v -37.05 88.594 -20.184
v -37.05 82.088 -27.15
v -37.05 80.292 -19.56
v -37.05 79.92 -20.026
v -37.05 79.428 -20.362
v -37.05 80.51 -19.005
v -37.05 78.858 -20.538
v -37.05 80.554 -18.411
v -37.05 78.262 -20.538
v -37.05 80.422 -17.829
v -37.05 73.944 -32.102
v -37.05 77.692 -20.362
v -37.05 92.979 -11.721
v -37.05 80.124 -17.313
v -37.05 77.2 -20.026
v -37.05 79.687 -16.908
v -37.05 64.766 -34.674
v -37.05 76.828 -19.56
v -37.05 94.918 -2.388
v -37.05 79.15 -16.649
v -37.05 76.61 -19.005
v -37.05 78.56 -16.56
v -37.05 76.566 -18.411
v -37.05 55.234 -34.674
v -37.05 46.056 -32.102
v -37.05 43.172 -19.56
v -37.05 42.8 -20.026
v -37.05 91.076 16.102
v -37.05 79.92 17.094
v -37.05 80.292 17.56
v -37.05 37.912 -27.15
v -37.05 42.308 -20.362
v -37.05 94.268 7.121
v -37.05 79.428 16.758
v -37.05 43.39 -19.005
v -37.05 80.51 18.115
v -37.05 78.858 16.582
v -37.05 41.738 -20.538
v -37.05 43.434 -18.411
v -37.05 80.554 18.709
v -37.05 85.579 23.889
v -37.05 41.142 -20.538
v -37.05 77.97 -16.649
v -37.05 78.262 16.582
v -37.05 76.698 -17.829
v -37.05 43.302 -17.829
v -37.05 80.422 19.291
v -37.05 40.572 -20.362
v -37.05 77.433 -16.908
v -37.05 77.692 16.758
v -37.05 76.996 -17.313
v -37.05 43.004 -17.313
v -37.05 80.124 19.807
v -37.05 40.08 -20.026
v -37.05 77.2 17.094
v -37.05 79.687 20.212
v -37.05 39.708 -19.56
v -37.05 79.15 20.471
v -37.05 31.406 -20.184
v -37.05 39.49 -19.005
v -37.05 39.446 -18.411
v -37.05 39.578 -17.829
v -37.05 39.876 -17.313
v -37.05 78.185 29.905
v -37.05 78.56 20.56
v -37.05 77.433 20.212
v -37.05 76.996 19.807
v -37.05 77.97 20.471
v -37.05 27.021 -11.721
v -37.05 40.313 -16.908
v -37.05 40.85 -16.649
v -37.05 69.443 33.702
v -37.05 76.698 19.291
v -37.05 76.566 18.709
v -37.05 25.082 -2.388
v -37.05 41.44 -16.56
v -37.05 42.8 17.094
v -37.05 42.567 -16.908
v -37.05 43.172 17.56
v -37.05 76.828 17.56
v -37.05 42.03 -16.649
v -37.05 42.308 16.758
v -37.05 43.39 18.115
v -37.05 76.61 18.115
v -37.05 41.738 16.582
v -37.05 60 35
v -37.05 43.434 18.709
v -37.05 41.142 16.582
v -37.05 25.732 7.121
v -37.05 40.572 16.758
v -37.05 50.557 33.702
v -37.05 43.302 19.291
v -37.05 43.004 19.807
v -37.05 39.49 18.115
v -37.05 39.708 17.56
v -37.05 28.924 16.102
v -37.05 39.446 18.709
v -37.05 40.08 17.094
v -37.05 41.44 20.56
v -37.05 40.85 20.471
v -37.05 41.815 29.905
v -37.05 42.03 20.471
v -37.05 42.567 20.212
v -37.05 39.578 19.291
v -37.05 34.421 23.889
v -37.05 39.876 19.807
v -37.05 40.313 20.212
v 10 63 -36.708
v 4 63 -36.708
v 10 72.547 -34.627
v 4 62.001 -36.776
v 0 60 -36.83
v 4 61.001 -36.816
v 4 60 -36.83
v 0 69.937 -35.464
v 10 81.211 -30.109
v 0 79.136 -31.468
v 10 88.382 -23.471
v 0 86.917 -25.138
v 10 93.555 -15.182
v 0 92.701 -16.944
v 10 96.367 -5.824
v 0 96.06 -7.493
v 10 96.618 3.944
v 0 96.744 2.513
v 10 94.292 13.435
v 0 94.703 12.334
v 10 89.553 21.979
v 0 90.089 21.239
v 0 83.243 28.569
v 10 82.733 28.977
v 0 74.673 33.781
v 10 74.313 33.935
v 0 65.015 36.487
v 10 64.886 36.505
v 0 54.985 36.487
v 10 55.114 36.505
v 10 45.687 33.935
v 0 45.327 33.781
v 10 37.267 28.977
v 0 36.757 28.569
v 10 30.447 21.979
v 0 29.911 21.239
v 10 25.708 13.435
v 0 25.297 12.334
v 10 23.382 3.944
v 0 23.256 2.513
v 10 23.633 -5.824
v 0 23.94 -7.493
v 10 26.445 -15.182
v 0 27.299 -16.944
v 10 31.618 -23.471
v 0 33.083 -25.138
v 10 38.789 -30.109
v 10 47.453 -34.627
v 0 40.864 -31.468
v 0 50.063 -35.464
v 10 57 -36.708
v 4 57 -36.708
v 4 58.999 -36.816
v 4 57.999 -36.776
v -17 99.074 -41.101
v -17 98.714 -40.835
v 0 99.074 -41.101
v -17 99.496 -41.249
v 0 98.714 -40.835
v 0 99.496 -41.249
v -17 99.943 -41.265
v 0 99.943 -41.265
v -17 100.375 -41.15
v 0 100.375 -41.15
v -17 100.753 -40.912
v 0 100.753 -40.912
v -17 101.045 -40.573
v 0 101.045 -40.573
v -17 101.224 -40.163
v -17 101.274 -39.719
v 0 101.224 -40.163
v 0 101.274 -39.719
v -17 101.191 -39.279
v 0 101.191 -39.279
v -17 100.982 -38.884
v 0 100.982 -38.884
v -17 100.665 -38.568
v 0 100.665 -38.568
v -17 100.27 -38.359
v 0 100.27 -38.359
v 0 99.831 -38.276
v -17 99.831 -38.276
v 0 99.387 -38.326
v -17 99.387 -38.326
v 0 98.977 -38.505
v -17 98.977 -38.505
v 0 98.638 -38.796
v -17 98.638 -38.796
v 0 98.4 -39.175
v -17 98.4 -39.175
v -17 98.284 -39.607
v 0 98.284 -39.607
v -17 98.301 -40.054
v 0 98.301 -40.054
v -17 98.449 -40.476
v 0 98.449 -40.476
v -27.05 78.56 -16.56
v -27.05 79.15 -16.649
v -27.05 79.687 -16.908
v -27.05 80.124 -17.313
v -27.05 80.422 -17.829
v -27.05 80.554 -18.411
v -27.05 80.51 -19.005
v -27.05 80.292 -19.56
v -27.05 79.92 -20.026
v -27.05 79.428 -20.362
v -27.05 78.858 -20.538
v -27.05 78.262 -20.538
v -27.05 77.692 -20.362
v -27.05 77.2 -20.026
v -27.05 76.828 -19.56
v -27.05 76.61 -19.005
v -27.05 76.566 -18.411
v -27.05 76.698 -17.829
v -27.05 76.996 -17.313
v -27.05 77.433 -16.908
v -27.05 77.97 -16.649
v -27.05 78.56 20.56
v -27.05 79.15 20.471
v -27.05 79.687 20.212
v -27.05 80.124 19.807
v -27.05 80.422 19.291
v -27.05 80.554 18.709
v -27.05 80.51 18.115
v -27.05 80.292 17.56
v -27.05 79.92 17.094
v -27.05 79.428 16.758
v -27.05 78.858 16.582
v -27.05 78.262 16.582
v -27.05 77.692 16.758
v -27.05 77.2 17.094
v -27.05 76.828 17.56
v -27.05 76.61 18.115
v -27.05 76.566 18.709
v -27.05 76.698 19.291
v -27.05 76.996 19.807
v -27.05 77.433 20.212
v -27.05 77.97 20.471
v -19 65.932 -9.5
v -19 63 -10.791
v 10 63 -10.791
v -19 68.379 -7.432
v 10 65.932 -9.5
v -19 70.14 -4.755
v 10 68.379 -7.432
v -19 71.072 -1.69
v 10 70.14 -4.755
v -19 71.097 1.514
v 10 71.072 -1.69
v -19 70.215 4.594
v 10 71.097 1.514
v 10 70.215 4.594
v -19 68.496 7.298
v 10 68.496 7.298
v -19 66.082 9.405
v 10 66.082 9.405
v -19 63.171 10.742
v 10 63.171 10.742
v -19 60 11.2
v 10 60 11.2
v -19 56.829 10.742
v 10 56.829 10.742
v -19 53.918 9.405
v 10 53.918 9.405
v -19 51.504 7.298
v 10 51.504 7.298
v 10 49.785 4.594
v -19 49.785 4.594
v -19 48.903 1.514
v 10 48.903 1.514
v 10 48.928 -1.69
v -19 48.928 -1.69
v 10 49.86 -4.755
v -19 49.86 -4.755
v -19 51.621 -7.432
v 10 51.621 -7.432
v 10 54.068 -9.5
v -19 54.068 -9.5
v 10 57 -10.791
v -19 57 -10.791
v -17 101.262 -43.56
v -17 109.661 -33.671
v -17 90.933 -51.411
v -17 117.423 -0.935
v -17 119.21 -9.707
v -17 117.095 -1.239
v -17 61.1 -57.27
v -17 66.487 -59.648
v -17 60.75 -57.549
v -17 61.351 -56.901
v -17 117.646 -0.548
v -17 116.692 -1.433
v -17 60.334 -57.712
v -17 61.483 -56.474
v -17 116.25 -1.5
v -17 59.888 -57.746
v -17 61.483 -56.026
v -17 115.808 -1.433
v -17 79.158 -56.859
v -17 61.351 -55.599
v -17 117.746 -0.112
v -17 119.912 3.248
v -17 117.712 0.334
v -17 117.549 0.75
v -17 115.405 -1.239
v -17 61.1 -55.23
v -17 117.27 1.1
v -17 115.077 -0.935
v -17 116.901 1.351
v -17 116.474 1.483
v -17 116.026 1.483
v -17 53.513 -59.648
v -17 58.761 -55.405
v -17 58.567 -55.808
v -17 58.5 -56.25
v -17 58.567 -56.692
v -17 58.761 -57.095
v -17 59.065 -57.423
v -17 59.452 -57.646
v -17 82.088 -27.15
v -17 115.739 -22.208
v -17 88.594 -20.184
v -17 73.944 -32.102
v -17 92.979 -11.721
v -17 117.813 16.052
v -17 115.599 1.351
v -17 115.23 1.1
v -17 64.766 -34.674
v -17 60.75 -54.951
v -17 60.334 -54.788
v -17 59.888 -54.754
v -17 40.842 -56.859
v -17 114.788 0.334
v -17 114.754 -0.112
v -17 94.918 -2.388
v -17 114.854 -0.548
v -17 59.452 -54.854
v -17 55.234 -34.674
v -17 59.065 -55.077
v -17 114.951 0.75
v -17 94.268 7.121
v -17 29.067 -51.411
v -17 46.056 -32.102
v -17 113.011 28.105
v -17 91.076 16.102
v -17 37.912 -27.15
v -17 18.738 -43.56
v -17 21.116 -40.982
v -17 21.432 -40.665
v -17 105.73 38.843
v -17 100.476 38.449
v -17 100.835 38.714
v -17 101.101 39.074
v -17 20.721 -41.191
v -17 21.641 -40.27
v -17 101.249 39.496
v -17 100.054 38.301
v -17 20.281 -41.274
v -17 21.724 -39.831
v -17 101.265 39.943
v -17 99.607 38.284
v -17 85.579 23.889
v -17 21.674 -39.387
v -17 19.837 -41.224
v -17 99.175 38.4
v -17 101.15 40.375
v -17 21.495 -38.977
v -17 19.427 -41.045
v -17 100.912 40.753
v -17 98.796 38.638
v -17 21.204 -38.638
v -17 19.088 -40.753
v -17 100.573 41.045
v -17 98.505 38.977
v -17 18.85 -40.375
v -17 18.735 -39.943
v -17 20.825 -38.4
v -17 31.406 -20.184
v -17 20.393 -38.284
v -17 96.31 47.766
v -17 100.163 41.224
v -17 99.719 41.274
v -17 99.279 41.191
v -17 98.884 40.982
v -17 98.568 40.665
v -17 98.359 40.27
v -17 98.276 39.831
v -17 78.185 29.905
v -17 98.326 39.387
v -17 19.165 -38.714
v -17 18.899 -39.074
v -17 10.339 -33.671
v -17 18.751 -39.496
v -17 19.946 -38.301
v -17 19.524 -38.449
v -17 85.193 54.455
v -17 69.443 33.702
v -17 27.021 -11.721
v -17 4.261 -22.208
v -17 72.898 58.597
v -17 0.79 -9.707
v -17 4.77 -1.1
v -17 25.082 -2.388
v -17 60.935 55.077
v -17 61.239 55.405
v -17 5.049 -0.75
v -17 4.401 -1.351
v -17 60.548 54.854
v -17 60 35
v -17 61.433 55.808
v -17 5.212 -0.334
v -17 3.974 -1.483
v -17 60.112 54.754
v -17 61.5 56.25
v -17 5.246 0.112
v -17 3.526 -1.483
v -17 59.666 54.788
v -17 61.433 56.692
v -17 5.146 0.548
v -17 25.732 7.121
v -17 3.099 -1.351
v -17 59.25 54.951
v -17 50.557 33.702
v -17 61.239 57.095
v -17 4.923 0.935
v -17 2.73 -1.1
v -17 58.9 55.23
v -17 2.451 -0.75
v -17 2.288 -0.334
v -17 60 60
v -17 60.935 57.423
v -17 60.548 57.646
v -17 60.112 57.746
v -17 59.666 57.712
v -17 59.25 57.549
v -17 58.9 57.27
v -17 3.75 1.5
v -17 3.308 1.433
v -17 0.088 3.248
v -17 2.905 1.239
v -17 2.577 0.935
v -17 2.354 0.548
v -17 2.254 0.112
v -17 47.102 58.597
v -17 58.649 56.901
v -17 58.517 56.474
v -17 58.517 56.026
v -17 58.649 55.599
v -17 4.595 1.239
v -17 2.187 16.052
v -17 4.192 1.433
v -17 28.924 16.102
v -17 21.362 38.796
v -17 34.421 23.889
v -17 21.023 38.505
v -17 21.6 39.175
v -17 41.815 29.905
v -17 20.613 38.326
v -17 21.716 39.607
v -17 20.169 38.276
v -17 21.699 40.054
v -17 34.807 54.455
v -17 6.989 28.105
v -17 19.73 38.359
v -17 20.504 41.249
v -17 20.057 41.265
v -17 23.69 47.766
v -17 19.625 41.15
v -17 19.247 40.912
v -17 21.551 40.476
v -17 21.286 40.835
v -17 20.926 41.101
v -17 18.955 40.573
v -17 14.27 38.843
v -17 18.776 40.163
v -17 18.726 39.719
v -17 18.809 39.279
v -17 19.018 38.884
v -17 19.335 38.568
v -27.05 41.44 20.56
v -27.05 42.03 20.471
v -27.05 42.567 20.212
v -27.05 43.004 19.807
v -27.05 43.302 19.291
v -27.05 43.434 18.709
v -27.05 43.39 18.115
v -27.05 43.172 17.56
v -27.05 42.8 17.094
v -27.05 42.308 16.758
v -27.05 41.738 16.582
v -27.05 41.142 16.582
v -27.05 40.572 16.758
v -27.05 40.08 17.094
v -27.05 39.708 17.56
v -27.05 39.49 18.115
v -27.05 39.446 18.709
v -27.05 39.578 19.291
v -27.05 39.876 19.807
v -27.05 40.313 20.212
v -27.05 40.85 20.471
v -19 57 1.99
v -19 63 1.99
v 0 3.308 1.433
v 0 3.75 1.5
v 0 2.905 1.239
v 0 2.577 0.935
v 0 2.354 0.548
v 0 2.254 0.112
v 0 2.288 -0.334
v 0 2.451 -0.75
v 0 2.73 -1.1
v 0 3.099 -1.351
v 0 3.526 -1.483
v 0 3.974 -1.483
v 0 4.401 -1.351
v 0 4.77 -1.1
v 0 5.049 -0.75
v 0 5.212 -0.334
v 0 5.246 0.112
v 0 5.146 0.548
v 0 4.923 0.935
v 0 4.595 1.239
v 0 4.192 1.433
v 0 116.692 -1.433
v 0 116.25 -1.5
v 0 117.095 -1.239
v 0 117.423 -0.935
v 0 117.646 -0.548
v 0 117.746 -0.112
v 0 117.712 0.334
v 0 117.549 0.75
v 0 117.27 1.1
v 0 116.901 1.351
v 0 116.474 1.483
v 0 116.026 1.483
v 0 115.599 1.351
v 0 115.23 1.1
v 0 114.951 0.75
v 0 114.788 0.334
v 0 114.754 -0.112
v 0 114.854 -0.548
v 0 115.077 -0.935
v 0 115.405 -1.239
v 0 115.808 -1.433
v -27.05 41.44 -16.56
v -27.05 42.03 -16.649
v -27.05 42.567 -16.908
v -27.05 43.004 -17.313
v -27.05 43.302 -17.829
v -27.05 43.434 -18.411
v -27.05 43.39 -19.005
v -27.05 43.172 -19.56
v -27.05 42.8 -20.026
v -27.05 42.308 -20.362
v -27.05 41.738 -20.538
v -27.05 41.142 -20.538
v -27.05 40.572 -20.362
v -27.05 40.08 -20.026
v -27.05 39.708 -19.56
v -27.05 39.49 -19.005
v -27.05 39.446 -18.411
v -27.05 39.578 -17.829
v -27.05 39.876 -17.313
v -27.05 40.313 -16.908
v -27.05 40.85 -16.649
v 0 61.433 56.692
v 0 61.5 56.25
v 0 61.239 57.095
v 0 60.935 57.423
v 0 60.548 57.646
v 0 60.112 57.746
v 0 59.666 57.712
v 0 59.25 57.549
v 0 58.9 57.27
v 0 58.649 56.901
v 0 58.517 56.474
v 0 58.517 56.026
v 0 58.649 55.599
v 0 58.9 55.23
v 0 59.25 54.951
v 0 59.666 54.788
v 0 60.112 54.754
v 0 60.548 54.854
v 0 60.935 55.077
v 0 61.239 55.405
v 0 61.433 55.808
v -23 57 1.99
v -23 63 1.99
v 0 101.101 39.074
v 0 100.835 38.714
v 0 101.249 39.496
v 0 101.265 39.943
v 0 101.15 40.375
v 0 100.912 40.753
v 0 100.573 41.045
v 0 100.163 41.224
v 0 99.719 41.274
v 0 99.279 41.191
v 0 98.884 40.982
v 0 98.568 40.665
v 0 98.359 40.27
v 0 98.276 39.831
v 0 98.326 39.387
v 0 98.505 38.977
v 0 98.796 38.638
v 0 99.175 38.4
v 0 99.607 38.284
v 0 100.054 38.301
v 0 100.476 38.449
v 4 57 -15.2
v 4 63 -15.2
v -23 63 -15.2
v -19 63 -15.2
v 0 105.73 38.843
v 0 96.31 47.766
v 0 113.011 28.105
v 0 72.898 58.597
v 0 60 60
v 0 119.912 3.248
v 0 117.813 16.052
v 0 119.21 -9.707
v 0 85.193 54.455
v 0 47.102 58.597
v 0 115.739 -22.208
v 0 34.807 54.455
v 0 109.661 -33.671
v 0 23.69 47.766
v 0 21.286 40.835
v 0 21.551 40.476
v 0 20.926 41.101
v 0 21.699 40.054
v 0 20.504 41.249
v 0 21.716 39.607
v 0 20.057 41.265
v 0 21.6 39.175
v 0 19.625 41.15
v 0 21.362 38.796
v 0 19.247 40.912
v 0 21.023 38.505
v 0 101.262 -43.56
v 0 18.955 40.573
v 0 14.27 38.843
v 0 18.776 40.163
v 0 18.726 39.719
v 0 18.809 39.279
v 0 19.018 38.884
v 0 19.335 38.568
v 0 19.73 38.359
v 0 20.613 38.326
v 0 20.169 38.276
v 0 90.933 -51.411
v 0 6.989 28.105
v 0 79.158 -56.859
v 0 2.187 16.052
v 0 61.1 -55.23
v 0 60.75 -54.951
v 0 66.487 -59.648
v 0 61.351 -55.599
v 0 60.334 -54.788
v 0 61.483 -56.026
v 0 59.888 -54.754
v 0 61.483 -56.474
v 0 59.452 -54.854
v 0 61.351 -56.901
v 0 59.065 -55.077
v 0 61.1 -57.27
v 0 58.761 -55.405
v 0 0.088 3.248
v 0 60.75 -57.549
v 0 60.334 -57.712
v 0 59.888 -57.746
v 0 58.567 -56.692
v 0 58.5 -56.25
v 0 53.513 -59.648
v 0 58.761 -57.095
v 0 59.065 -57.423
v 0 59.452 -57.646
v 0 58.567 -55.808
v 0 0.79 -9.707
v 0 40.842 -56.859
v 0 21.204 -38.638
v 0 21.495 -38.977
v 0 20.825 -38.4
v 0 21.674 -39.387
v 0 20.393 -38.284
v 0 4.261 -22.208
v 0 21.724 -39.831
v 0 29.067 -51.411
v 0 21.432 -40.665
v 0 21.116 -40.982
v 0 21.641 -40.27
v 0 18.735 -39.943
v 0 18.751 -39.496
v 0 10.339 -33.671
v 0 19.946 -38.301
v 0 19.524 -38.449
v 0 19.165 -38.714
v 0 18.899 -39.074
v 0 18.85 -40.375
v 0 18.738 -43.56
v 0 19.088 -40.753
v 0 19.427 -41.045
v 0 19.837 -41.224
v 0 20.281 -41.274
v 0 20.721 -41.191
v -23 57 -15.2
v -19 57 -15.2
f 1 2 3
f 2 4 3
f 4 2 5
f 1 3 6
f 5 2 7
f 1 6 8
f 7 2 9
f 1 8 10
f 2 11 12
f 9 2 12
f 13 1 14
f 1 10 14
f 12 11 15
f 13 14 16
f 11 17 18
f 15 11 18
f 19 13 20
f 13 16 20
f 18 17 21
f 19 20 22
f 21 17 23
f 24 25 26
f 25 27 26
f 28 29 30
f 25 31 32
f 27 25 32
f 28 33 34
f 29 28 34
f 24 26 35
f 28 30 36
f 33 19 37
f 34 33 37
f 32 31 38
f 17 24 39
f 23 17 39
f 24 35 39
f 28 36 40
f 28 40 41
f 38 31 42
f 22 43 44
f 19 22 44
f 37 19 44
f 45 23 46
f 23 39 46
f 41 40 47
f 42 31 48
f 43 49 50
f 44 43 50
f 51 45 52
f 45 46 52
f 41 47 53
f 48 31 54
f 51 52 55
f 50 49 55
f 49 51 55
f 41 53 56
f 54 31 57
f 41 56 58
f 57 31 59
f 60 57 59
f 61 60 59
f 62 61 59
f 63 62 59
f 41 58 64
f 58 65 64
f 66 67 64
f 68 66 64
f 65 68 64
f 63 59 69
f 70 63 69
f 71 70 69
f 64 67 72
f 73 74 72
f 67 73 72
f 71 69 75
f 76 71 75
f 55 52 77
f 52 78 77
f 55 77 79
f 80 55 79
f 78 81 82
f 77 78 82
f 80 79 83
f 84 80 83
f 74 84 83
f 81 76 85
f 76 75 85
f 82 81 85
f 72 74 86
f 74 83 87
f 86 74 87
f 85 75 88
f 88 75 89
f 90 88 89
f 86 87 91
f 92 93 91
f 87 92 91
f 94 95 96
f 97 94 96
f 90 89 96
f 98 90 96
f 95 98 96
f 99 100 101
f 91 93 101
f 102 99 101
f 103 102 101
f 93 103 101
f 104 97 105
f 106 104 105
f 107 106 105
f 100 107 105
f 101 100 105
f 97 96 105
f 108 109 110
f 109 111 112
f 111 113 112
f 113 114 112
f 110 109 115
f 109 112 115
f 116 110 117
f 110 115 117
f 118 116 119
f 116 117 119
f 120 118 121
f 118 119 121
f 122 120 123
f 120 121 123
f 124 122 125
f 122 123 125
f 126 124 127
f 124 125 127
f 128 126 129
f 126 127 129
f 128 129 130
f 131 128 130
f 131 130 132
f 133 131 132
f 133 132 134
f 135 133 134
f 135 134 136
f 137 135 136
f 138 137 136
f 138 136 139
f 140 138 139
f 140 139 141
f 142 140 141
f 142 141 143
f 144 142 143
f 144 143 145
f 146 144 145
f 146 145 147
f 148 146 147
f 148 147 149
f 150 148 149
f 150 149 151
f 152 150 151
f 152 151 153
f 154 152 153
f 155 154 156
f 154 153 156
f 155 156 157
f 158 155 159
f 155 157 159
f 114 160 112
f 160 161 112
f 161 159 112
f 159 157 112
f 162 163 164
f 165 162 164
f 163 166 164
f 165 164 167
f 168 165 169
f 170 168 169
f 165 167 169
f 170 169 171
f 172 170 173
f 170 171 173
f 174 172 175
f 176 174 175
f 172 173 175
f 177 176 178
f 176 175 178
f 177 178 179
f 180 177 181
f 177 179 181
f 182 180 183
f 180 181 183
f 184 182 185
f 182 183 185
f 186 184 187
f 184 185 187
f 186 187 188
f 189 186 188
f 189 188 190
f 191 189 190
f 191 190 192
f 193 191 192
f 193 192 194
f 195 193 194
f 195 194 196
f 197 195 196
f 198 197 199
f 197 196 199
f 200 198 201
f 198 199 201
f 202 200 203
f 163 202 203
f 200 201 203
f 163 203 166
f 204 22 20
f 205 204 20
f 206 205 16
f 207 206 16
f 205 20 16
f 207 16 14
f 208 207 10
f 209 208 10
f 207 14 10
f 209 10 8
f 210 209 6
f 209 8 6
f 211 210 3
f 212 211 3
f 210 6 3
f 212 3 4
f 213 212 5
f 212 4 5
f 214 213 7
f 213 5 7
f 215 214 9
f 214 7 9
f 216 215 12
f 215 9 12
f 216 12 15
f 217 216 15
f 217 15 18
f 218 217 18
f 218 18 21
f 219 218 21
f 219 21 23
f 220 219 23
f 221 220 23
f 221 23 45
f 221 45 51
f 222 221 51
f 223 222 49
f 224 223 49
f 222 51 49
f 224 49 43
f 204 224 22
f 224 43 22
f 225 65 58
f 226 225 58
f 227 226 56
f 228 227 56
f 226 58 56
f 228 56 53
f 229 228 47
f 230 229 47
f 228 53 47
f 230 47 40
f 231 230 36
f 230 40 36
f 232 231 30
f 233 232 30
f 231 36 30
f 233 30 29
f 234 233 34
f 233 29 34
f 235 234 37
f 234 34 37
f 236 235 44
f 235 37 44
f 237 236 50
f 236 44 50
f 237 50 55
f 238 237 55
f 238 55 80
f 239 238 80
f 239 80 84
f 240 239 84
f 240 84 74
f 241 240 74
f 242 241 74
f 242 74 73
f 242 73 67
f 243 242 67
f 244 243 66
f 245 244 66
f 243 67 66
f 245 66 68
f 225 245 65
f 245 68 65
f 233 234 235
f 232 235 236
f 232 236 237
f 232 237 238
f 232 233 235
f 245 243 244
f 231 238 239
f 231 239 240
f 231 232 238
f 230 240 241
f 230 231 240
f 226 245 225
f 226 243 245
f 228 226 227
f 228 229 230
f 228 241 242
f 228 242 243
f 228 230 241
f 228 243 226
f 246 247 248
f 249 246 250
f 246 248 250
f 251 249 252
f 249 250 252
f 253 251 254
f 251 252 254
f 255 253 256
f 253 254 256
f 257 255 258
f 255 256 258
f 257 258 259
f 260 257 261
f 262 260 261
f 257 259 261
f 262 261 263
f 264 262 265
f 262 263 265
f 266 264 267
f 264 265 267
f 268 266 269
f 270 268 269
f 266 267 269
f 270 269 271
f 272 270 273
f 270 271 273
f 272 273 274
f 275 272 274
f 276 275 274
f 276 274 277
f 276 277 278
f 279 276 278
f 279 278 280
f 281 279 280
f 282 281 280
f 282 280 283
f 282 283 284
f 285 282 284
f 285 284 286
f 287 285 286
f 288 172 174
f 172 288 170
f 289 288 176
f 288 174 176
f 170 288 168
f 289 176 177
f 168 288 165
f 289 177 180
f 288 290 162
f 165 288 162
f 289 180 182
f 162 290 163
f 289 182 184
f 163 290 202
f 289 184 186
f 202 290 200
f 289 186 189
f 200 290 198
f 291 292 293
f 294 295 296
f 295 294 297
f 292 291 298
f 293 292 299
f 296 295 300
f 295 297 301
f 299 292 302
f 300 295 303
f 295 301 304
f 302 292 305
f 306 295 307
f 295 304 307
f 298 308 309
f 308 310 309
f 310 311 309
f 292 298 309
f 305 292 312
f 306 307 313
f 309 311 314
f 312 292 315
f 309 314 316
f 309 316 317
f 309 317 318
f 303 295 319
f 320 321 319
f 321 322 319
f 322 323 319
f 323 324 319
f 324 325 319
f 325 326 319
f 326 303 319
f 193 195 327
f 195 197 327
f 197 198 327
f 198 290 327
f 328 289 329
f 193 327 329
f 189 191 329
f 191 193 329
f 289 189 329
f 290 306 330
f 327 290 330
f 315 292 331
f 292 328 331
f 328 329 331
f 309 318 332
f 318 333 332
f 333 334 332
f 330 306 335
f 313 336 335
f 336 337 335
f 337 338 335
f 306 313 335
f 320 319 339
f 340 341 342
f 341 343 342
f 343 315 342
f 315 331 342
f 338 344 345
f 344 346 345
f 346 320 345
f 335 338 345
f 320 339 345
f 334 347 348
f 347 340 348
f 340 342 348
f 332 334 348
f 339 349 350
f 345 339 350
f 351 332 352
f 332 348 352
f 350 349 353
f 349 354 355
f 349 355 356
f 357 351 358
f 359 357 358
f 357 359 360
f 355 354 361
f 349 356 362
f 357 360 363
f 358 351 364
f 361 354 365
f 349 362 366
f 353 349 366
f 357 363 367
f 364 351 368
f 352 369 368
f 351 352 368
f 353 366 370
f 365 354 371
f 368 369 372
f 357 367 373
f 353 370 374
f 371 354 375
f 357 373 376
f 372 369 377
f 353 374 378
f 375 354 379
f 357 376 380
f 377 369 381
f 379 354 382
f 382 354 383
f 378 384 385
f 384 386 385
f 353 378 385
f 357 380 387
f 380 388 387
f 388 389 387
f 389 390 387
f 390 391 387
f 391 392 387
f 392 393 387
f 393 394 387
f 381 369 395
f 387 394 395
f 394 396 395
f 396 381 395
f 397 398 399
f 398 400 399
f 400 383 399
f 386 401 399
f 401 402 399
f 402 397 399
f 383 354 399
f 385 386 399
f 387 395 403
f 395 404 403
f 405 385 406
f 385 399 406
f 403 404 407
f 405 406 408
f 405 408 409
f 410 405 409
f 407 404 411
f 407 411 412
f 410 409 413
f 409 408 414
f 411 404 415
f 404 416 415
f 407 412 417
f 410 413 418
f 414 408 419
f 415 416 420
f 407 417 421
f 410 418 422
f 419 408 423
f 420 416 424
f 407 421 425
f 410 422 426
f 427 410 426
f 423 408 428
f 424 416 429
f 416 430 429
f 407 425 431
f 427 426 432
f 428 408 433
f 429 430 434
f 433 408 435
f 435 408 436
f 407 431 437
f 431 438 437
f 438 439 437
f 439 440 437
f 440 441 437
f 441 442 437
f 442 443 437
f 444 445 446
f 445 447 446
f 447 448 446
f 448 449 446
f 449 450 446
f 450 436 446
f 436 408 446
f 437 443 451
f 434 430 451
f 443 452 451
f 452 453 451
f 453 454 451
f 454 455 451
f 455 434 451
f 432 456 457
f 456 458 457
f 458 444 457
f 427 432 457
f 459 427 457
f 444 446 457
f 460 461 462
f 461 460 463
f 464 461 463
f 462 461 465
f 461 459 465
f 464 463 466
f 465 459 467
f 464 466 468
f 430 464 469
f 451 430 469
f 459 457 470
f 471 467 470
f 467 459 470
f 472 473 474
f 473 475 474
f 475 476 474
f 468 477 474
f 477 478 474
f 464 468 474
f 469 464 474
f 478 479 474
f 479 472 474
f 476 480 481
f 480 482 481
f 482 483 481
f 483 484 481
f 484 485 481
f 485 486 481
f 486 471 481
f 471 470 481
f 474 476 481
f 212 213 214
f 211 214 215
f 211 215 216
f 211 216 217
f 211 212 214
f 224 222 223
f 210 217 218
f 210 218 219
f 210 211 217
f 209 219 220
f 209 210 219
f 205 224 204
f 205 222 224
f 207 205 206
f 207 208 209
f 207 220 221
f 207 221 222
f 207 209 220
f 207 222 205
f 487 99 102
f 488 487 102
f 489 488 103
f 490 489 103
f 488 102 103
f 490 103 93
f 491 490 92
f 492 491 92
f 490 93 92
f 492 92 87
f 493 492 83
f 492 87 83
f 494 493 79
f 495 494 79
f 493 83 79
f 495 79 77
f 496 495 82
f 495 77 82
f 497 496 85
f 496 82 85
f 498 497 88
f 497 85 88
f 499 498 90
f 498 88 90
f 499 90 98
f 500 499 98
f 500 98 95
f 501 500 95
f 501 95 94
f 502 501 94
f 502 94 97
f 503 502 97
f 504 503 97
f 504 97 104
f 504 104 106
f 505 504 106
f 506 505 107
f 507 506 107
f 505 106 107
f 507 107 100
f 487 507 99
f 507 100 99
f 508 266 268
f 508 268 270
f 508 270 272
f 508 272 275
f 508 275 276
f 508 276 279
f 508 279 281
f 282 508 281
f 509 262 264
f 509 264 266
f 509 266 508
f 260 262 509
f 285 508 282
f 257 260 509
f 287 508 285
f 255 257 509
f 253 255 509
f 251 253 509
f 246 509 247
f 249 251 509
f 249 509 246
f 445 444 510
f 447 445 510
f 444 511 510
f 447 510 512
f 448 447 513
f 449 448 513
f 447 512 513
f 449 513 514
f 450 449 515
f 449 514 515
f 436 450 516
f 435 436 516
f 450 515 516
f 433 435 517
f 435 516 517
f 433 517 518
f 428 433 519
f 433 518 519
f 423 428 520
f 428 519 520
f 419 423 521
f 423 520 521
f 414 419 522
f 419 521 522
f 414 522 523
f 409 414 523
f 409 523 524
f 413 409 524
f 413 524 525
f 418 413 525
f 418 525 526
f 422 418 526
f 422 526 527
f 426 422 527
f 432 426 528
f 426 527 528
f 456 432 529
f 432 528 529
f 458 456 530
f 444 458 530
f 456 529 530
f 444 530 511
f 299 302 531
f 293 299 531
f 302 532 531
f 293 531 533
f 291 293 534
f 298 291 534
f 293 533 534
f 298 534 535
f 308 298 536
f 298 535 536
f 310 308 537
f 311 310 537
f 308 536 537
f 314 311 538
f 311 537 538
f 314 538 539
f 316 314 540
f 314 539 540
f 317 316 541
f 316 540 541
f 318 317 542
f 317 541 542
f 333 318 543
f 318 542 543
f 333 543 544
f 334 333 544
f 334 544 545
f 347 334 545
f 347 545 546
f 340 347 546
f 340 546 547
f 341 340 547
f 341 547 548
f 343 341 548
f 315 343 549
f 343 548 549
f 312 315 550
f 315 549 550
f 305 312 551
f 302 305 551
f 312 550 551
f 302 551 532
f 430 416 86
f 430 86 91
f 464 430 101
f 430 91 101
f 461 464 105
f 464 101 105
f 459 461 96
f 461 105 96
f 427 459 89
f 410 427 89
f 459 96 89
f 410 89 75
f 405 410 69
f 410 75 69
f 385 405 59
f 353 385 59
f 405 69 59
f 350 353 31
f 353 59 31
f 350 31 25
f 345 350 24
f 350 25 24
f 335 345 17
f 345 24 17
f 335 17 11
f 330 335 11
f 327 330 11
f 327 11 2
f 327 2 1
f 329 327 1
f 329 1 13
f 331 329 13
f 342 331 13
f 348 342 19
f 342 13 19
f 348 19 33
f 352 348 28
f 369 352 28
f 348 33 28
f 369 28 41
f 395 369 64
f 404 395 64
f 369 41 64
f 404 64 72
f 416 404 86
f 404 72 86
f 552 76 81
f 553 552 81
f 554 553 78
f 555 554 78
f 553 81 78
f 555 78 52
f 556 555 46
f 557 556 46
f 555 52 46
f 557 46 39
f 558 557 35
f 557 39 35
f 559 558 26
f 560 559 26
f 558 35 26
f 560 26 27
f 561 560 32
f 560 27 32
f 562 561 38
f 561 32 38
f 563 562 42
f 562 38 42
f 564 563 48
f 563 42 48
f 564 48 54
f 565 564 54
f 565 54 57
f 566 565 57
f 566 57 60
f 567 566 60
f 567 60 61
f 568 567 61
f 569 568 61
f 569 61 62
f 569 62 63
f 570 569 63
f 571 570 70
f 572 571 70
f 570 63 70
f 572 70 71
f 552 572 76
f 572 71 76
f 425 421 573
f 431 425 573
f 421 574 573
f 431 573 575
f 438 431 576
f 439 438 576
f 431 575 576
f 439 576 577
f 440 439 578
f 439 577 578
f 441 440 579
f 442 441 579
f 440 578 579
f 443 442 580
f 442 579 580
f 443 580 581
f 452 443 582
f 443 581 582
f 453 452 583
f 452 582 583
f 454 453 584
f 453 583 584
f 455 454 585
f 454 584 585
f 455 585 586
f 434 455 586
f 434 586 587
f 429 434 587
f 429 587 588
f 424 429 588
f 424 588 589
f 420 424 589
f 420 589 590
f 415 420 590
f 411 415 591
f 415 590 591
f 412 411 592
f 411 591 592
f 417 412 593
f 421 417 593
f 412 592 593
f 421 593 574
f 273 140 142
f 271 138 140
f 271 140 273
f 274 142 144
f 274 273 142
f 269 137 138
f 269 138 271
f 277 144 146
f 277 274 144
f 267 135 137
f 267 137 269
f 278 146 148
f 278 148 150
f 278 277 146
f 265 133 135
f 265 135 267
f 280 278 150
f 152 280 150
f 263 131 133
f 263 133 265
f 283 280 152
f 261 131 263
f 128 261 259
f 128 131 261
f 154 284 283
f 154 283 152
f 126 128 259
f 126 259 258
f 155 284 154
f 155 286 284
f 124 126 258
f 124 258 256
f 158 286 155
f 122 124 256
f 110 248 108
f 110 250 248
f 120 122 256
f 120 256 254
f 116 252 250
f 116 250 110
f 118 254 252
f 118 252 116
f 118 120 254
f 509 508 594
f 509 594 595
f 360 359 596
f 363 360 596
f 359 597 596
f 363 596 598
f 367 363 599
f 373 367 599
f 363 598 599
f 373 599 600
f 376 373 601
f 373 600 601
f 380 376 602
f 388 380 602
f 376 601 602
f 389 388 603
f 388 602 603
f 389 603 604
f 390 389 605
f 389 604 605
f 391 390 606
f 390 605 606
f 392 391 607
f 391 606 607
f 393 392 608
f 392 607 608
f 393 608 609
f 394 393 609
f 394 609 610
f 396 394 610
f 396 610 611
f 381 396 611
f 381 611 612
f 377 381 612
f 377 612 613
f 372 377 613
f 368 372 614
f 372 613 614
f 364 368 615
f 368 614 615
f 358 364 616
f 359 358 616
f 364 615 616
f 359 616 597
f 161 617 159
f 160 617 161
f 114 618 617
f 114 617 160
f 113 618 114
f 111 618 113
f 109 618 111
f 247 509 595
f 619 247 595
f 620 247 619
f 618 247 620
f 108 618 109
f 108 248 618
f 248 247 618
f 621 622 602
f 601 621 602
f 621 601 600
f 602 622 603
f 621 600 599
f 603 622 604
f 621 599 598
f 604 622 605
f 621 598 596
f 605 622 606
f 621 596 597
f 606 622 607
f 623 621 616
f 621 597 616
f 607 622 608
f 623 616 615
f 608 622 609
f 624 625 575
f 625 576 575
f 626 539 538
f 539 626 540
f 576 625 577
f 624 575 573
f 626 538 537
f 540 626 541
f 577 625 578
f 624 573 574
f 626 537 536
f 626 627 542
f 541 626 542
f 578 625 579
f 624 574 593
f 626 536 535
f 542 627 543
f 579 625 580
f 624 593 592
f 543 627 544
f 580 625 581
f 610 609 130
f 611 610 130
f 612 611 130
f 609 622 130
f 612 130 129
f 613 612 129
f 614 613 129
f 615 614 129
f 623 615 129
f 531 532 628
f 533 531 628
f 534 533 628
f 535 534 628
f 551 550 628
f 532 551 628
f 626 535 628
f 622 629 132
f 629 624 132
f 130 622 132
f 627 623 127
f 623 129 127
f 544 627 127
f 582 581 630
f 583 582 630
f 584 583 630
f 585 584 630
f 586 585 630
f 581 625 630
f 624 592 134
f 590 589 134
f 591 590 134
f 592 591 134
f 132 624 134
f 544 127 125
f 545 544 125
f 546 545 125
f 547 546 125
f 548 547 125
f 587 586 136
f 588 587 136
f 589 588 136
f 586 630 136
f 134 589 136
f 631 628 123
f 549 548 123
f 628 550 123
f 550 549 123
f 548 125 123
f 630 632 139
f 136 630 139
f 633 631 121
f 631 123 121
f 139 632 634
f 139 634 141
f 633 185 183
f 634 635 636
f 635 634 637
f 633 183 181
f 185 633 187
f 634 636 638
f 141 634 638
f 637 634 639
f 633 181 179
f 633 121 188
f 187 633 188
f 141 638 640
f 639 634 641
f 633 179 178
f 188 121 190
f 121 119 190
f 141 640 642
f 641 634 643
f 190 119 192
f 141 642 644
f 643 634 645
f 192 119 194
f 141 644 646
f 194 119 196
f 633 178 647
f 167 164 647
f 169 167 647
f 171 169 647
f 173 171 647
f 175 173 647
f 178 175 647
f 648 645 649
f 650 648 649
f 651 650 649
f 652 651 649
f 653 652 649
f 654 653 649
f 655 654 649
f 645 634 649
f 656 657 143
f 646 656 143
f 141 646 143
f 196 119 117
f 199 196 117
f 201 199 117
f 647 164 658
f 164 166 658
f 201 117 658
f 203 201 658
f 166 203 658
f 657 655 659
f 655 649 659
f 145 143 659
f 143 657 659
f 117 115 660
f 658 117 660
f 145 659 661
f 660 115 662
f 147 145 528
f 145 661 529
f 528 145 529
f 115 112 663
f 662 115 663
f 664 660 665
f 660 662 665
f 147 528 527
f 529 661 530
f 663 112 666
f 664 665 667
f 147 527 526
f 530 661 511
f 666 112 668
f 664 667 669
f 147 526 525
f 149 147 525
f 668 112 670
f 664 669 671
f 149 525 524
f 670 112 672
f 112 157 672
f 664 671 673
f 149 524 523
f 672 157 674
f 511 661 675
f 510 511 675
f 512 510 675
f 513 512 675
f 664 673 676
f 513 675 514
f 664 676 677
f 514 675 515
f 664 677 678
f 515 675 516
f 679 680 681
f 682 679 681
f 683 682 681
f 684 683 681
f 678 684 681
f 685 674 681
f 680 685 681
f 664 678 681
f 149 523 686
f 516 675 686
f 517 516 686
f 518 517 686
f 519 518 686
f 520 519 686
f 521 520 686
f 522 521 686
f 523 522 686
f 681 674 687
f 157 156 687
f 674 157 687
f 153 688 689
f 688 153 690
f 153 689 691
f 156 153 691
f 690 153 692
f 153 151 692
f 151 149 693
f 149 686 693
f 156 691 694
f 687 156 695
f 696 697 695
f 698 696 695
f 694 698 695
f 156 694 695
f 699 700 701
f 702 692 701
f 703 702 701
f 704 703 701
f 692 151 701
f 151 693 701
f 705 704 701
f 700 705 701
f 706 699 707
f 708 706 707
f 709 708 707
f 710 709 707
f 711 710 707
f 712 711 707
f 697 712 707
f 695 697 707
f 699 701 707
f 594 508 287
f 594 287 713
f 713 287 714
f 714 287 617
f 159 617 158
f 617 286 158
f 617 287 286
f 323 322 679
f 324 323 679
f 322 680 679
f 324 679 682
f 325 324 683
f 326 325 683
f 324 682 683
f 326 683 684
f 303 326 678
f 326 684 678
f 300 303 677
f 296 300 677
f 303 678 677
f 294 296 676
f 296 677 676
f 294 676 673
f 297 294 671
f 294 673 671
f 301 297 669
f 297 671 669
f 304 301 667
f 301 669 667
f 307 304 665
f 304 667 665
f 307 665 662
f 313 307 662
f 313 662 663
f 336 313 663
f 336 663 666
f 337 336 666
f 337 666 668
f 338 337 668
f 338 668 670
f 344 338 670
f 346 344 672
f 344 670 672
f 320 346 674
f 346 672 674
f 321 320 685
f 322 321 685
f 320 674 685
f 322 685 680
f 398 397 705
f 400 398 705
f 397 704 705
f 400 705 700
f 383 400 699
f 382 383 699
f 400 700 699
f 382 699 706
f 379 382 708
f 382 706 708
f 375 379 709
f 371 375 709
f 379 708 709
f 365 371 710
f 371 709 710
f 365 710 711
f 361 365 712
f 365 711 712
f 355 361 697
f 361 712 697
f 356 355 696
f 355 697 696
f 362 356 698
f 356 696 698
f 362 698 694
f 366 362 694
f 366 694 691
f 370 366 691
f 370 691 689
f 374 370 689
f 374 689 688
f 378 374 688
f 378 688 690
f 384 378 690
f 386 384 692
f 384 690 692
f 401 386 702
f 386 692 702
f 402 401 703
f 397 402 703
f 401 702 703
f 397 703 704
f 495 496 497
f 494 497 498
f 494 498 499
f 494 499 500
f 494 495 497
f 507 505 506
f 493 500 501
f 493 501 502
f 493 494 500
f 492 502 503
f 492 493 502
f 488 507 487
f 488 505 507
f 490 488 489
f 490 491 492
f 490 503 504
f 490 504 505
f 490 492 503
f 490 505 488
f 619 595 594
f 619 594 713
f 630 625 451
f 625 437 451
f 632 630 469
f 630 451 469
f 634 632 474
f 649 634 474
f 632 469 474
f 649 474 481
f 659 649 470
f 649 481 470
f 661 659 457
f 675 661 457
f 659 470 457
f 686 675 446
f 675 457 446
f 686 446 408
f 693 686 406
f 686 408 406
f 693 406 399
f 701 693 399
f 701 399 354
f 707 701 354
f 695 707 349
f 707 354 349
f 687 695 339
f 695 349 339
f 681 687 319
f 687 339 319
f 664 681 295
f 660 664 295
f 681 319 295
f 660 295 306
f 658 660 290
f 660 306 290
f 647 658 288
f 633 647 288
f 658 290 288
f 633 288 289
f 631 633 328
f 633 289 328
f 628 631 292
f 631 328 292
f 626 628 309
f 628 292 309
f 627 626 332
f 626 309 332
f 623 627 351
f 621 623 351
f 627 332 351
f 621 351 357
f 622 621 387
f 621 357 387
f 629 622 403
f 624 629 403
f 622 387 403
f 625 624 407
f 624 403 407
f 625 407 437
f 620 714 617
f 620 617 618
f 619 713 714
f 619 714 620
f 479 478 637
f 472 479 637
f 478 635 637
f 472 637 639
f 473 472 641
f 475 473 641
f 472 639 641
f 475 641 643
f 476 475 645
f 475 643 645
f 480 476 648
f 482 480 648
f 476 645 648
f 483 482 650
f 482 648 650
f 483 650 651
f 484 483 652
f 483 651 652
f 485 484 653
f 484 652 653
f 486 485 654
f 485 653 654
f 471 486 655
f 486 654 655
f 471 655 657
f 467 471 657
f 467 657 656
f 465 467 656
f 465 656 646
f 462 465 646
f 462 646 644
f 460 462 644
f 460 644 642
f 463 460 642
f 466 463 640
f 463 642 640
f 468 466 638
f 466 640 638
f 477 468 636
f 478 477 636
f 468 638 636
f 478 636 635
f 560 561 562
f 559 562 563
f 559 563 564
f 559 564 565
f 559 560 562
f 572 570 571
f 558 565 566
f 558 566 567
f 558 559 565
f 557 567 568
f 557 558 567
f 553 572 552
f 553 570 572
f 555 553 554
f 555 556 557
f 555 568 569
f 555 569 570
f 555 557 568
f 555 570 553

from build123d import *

# Parameters (mm, degrees)
UPPER_CIRLCE_2_R   = 36.83
UPPER_CIRLCE_DEPTH = 10
SKETCH2_R          = 1.5
CUT_EXTRUDE1_DEPTH = 140.185855962
CIRPATTERN1_COUNT  = 8
PIN_SKETCH_R       = 2
CUT_EXTRUDE2_DEPTH = 10
SKETCH3_R          = 11.2
CUT_EXTRUDE3_DEPTH = 29
SKETCH4_W          = 8
SKETCH4_H          = 6
CUT_EXTRUDE4_DEPTH = 70
SKETCH6_W          = 22.346517692
SKETCH6_H          = 6
CUT_EXTRUDE5_DEPTH = 6
SKETCH7_W          = 17.189641189
SKETCH7_H          = 6
CUT_EXTRUDE6_DEPTH = 4


with BuildPart() as part:
    # Sketch1 → Revolve1 (revolve)
    with BuildSketch(Plane.XY, mode=Mode.PRIVATE) as revolve1_sk:
        Polygon((0, 0), (-17, 0), (-17, 25), (-37.05, 25), (-37.05, 60), (0, 60), align=None)
    revolve(revolve1_sk.sketch.rotate(Axis((-37.05, 60, 0), (1, 0, 0)), 270), axis=Axis((-37.05, 60, 0), (1, 0, 0)))

    # upper cirlce 2 → upper cirlce (add)
    with BuildSketch(Plane(origin=(0, 0, 0), x_dir=(0, 0, -1), z_dir=(1, 0, 0))):
        with Locations((0, 60)):
            Circle(UPPER_CIRLCE_2_R)
    extrude(amount=UPPER_CIRLCE_DEPTH)

    # Sketch2 → Cut-Extrude1 (cut, symmetric)
    with BuildSketch(Plane(origin=(0, 0, 0), x_dir=(0, 0, -1), z_dir=(1, 0, 0))):
        with Locations((0, 116.25)):
            Circle(SKETCH2_R)
    cut_extrude1 = extrude(amount=CUT_EXTRUDE1_DEPTH, both=True, mode=Mode.SUBTRACT)

    # CirPattern1: Cut-Extrude1 ×8 about axis
    cirpattern1_axis = Axis((0, 60, 0), (1, 0, 0))
    for i in range(1, CIRPATTERN1_COUNT):
        add(cut_extrude1.rotate(cirpattern1_axis, i * 360 / CIRPATTERN1_COUNT), mode=Mode.SUBTRACT)

    # pin sketch → Cut-Extrude2 (cut)
    with BuildSketch(Plane.ZY.offset(37.05)):
        with Locations((-18.56, 78.56)):
            Circle(PIN_SKETCH_R)
        with Locations((18.56, 78.56)):
            Circle(PIN_SKETCH_R)
        with Locations((18.56, 41.44)):
            Circle(PIN_SKETCH_R)
        with Locations((-18.56, 41.44)):
            Circle(PIN_SKETCH_R)
    extrude(amount=-CUT_EXTRUDE2_DEPTH, mode=Mode.SUBTRACT)

    # Sketch3 → Cut-Extrude3 (cut)
    with BuildSketch(Plane(origin=(10, 0, 0), x_dir=(0, 0, -1), z_dir=(1, 0, 0))):
        with Locations((0, 60)):
            Circle(SKETCH3_R)
    extrude(amount=-CUT_EXTRUDE3_DEPTH, mode=Mode.SUBTRACT)

    # Sketch4 → Cut-Extrude4 (cut)
    with BuildSketch(Plane(origin=(-19, 0, 0), x_dir=(0, 0, -1), z_dir=(1, 0, 0))):
        with Locations((11.2, 60)):
            Rectangle(SKETCH4_W, SKETCH4_H)
    extrude(amount=CUT_EXTRUDE4_DEPTH, mode=Mode.SUBTRACT)

    # Sketch6 → Cut-Extrude5 (cut)
    with BuildSketch(Plane(origin=(10, 0, 0), x_dir=(0, 0, -1), z_dir=(1, 0, 0))):
        with Locations((26.373258846, 60)):
            Rectangle(SKETCH6_W, SKETCH6_H)
    extrude(amount=-CUT_EXTRUDE5_DEPTH, mode=Mode.SUBTRACT)

    # Sketch7 → Cut-Extrude6 (cut)
    with BuildSketch(Plane(origin=(-19, 0, 0), x_dir=(0, 0, -1), z_dir=(1, 0, 0))):
        with Locations((6.605179406, 60)):
            Rectangle(SKETCH7_W, SKETCH7_H)
    extrude(amount=-CUT_EXTRUDE6_DEPTH, mode=Mode.SUBTRACT)


solid = part.part
